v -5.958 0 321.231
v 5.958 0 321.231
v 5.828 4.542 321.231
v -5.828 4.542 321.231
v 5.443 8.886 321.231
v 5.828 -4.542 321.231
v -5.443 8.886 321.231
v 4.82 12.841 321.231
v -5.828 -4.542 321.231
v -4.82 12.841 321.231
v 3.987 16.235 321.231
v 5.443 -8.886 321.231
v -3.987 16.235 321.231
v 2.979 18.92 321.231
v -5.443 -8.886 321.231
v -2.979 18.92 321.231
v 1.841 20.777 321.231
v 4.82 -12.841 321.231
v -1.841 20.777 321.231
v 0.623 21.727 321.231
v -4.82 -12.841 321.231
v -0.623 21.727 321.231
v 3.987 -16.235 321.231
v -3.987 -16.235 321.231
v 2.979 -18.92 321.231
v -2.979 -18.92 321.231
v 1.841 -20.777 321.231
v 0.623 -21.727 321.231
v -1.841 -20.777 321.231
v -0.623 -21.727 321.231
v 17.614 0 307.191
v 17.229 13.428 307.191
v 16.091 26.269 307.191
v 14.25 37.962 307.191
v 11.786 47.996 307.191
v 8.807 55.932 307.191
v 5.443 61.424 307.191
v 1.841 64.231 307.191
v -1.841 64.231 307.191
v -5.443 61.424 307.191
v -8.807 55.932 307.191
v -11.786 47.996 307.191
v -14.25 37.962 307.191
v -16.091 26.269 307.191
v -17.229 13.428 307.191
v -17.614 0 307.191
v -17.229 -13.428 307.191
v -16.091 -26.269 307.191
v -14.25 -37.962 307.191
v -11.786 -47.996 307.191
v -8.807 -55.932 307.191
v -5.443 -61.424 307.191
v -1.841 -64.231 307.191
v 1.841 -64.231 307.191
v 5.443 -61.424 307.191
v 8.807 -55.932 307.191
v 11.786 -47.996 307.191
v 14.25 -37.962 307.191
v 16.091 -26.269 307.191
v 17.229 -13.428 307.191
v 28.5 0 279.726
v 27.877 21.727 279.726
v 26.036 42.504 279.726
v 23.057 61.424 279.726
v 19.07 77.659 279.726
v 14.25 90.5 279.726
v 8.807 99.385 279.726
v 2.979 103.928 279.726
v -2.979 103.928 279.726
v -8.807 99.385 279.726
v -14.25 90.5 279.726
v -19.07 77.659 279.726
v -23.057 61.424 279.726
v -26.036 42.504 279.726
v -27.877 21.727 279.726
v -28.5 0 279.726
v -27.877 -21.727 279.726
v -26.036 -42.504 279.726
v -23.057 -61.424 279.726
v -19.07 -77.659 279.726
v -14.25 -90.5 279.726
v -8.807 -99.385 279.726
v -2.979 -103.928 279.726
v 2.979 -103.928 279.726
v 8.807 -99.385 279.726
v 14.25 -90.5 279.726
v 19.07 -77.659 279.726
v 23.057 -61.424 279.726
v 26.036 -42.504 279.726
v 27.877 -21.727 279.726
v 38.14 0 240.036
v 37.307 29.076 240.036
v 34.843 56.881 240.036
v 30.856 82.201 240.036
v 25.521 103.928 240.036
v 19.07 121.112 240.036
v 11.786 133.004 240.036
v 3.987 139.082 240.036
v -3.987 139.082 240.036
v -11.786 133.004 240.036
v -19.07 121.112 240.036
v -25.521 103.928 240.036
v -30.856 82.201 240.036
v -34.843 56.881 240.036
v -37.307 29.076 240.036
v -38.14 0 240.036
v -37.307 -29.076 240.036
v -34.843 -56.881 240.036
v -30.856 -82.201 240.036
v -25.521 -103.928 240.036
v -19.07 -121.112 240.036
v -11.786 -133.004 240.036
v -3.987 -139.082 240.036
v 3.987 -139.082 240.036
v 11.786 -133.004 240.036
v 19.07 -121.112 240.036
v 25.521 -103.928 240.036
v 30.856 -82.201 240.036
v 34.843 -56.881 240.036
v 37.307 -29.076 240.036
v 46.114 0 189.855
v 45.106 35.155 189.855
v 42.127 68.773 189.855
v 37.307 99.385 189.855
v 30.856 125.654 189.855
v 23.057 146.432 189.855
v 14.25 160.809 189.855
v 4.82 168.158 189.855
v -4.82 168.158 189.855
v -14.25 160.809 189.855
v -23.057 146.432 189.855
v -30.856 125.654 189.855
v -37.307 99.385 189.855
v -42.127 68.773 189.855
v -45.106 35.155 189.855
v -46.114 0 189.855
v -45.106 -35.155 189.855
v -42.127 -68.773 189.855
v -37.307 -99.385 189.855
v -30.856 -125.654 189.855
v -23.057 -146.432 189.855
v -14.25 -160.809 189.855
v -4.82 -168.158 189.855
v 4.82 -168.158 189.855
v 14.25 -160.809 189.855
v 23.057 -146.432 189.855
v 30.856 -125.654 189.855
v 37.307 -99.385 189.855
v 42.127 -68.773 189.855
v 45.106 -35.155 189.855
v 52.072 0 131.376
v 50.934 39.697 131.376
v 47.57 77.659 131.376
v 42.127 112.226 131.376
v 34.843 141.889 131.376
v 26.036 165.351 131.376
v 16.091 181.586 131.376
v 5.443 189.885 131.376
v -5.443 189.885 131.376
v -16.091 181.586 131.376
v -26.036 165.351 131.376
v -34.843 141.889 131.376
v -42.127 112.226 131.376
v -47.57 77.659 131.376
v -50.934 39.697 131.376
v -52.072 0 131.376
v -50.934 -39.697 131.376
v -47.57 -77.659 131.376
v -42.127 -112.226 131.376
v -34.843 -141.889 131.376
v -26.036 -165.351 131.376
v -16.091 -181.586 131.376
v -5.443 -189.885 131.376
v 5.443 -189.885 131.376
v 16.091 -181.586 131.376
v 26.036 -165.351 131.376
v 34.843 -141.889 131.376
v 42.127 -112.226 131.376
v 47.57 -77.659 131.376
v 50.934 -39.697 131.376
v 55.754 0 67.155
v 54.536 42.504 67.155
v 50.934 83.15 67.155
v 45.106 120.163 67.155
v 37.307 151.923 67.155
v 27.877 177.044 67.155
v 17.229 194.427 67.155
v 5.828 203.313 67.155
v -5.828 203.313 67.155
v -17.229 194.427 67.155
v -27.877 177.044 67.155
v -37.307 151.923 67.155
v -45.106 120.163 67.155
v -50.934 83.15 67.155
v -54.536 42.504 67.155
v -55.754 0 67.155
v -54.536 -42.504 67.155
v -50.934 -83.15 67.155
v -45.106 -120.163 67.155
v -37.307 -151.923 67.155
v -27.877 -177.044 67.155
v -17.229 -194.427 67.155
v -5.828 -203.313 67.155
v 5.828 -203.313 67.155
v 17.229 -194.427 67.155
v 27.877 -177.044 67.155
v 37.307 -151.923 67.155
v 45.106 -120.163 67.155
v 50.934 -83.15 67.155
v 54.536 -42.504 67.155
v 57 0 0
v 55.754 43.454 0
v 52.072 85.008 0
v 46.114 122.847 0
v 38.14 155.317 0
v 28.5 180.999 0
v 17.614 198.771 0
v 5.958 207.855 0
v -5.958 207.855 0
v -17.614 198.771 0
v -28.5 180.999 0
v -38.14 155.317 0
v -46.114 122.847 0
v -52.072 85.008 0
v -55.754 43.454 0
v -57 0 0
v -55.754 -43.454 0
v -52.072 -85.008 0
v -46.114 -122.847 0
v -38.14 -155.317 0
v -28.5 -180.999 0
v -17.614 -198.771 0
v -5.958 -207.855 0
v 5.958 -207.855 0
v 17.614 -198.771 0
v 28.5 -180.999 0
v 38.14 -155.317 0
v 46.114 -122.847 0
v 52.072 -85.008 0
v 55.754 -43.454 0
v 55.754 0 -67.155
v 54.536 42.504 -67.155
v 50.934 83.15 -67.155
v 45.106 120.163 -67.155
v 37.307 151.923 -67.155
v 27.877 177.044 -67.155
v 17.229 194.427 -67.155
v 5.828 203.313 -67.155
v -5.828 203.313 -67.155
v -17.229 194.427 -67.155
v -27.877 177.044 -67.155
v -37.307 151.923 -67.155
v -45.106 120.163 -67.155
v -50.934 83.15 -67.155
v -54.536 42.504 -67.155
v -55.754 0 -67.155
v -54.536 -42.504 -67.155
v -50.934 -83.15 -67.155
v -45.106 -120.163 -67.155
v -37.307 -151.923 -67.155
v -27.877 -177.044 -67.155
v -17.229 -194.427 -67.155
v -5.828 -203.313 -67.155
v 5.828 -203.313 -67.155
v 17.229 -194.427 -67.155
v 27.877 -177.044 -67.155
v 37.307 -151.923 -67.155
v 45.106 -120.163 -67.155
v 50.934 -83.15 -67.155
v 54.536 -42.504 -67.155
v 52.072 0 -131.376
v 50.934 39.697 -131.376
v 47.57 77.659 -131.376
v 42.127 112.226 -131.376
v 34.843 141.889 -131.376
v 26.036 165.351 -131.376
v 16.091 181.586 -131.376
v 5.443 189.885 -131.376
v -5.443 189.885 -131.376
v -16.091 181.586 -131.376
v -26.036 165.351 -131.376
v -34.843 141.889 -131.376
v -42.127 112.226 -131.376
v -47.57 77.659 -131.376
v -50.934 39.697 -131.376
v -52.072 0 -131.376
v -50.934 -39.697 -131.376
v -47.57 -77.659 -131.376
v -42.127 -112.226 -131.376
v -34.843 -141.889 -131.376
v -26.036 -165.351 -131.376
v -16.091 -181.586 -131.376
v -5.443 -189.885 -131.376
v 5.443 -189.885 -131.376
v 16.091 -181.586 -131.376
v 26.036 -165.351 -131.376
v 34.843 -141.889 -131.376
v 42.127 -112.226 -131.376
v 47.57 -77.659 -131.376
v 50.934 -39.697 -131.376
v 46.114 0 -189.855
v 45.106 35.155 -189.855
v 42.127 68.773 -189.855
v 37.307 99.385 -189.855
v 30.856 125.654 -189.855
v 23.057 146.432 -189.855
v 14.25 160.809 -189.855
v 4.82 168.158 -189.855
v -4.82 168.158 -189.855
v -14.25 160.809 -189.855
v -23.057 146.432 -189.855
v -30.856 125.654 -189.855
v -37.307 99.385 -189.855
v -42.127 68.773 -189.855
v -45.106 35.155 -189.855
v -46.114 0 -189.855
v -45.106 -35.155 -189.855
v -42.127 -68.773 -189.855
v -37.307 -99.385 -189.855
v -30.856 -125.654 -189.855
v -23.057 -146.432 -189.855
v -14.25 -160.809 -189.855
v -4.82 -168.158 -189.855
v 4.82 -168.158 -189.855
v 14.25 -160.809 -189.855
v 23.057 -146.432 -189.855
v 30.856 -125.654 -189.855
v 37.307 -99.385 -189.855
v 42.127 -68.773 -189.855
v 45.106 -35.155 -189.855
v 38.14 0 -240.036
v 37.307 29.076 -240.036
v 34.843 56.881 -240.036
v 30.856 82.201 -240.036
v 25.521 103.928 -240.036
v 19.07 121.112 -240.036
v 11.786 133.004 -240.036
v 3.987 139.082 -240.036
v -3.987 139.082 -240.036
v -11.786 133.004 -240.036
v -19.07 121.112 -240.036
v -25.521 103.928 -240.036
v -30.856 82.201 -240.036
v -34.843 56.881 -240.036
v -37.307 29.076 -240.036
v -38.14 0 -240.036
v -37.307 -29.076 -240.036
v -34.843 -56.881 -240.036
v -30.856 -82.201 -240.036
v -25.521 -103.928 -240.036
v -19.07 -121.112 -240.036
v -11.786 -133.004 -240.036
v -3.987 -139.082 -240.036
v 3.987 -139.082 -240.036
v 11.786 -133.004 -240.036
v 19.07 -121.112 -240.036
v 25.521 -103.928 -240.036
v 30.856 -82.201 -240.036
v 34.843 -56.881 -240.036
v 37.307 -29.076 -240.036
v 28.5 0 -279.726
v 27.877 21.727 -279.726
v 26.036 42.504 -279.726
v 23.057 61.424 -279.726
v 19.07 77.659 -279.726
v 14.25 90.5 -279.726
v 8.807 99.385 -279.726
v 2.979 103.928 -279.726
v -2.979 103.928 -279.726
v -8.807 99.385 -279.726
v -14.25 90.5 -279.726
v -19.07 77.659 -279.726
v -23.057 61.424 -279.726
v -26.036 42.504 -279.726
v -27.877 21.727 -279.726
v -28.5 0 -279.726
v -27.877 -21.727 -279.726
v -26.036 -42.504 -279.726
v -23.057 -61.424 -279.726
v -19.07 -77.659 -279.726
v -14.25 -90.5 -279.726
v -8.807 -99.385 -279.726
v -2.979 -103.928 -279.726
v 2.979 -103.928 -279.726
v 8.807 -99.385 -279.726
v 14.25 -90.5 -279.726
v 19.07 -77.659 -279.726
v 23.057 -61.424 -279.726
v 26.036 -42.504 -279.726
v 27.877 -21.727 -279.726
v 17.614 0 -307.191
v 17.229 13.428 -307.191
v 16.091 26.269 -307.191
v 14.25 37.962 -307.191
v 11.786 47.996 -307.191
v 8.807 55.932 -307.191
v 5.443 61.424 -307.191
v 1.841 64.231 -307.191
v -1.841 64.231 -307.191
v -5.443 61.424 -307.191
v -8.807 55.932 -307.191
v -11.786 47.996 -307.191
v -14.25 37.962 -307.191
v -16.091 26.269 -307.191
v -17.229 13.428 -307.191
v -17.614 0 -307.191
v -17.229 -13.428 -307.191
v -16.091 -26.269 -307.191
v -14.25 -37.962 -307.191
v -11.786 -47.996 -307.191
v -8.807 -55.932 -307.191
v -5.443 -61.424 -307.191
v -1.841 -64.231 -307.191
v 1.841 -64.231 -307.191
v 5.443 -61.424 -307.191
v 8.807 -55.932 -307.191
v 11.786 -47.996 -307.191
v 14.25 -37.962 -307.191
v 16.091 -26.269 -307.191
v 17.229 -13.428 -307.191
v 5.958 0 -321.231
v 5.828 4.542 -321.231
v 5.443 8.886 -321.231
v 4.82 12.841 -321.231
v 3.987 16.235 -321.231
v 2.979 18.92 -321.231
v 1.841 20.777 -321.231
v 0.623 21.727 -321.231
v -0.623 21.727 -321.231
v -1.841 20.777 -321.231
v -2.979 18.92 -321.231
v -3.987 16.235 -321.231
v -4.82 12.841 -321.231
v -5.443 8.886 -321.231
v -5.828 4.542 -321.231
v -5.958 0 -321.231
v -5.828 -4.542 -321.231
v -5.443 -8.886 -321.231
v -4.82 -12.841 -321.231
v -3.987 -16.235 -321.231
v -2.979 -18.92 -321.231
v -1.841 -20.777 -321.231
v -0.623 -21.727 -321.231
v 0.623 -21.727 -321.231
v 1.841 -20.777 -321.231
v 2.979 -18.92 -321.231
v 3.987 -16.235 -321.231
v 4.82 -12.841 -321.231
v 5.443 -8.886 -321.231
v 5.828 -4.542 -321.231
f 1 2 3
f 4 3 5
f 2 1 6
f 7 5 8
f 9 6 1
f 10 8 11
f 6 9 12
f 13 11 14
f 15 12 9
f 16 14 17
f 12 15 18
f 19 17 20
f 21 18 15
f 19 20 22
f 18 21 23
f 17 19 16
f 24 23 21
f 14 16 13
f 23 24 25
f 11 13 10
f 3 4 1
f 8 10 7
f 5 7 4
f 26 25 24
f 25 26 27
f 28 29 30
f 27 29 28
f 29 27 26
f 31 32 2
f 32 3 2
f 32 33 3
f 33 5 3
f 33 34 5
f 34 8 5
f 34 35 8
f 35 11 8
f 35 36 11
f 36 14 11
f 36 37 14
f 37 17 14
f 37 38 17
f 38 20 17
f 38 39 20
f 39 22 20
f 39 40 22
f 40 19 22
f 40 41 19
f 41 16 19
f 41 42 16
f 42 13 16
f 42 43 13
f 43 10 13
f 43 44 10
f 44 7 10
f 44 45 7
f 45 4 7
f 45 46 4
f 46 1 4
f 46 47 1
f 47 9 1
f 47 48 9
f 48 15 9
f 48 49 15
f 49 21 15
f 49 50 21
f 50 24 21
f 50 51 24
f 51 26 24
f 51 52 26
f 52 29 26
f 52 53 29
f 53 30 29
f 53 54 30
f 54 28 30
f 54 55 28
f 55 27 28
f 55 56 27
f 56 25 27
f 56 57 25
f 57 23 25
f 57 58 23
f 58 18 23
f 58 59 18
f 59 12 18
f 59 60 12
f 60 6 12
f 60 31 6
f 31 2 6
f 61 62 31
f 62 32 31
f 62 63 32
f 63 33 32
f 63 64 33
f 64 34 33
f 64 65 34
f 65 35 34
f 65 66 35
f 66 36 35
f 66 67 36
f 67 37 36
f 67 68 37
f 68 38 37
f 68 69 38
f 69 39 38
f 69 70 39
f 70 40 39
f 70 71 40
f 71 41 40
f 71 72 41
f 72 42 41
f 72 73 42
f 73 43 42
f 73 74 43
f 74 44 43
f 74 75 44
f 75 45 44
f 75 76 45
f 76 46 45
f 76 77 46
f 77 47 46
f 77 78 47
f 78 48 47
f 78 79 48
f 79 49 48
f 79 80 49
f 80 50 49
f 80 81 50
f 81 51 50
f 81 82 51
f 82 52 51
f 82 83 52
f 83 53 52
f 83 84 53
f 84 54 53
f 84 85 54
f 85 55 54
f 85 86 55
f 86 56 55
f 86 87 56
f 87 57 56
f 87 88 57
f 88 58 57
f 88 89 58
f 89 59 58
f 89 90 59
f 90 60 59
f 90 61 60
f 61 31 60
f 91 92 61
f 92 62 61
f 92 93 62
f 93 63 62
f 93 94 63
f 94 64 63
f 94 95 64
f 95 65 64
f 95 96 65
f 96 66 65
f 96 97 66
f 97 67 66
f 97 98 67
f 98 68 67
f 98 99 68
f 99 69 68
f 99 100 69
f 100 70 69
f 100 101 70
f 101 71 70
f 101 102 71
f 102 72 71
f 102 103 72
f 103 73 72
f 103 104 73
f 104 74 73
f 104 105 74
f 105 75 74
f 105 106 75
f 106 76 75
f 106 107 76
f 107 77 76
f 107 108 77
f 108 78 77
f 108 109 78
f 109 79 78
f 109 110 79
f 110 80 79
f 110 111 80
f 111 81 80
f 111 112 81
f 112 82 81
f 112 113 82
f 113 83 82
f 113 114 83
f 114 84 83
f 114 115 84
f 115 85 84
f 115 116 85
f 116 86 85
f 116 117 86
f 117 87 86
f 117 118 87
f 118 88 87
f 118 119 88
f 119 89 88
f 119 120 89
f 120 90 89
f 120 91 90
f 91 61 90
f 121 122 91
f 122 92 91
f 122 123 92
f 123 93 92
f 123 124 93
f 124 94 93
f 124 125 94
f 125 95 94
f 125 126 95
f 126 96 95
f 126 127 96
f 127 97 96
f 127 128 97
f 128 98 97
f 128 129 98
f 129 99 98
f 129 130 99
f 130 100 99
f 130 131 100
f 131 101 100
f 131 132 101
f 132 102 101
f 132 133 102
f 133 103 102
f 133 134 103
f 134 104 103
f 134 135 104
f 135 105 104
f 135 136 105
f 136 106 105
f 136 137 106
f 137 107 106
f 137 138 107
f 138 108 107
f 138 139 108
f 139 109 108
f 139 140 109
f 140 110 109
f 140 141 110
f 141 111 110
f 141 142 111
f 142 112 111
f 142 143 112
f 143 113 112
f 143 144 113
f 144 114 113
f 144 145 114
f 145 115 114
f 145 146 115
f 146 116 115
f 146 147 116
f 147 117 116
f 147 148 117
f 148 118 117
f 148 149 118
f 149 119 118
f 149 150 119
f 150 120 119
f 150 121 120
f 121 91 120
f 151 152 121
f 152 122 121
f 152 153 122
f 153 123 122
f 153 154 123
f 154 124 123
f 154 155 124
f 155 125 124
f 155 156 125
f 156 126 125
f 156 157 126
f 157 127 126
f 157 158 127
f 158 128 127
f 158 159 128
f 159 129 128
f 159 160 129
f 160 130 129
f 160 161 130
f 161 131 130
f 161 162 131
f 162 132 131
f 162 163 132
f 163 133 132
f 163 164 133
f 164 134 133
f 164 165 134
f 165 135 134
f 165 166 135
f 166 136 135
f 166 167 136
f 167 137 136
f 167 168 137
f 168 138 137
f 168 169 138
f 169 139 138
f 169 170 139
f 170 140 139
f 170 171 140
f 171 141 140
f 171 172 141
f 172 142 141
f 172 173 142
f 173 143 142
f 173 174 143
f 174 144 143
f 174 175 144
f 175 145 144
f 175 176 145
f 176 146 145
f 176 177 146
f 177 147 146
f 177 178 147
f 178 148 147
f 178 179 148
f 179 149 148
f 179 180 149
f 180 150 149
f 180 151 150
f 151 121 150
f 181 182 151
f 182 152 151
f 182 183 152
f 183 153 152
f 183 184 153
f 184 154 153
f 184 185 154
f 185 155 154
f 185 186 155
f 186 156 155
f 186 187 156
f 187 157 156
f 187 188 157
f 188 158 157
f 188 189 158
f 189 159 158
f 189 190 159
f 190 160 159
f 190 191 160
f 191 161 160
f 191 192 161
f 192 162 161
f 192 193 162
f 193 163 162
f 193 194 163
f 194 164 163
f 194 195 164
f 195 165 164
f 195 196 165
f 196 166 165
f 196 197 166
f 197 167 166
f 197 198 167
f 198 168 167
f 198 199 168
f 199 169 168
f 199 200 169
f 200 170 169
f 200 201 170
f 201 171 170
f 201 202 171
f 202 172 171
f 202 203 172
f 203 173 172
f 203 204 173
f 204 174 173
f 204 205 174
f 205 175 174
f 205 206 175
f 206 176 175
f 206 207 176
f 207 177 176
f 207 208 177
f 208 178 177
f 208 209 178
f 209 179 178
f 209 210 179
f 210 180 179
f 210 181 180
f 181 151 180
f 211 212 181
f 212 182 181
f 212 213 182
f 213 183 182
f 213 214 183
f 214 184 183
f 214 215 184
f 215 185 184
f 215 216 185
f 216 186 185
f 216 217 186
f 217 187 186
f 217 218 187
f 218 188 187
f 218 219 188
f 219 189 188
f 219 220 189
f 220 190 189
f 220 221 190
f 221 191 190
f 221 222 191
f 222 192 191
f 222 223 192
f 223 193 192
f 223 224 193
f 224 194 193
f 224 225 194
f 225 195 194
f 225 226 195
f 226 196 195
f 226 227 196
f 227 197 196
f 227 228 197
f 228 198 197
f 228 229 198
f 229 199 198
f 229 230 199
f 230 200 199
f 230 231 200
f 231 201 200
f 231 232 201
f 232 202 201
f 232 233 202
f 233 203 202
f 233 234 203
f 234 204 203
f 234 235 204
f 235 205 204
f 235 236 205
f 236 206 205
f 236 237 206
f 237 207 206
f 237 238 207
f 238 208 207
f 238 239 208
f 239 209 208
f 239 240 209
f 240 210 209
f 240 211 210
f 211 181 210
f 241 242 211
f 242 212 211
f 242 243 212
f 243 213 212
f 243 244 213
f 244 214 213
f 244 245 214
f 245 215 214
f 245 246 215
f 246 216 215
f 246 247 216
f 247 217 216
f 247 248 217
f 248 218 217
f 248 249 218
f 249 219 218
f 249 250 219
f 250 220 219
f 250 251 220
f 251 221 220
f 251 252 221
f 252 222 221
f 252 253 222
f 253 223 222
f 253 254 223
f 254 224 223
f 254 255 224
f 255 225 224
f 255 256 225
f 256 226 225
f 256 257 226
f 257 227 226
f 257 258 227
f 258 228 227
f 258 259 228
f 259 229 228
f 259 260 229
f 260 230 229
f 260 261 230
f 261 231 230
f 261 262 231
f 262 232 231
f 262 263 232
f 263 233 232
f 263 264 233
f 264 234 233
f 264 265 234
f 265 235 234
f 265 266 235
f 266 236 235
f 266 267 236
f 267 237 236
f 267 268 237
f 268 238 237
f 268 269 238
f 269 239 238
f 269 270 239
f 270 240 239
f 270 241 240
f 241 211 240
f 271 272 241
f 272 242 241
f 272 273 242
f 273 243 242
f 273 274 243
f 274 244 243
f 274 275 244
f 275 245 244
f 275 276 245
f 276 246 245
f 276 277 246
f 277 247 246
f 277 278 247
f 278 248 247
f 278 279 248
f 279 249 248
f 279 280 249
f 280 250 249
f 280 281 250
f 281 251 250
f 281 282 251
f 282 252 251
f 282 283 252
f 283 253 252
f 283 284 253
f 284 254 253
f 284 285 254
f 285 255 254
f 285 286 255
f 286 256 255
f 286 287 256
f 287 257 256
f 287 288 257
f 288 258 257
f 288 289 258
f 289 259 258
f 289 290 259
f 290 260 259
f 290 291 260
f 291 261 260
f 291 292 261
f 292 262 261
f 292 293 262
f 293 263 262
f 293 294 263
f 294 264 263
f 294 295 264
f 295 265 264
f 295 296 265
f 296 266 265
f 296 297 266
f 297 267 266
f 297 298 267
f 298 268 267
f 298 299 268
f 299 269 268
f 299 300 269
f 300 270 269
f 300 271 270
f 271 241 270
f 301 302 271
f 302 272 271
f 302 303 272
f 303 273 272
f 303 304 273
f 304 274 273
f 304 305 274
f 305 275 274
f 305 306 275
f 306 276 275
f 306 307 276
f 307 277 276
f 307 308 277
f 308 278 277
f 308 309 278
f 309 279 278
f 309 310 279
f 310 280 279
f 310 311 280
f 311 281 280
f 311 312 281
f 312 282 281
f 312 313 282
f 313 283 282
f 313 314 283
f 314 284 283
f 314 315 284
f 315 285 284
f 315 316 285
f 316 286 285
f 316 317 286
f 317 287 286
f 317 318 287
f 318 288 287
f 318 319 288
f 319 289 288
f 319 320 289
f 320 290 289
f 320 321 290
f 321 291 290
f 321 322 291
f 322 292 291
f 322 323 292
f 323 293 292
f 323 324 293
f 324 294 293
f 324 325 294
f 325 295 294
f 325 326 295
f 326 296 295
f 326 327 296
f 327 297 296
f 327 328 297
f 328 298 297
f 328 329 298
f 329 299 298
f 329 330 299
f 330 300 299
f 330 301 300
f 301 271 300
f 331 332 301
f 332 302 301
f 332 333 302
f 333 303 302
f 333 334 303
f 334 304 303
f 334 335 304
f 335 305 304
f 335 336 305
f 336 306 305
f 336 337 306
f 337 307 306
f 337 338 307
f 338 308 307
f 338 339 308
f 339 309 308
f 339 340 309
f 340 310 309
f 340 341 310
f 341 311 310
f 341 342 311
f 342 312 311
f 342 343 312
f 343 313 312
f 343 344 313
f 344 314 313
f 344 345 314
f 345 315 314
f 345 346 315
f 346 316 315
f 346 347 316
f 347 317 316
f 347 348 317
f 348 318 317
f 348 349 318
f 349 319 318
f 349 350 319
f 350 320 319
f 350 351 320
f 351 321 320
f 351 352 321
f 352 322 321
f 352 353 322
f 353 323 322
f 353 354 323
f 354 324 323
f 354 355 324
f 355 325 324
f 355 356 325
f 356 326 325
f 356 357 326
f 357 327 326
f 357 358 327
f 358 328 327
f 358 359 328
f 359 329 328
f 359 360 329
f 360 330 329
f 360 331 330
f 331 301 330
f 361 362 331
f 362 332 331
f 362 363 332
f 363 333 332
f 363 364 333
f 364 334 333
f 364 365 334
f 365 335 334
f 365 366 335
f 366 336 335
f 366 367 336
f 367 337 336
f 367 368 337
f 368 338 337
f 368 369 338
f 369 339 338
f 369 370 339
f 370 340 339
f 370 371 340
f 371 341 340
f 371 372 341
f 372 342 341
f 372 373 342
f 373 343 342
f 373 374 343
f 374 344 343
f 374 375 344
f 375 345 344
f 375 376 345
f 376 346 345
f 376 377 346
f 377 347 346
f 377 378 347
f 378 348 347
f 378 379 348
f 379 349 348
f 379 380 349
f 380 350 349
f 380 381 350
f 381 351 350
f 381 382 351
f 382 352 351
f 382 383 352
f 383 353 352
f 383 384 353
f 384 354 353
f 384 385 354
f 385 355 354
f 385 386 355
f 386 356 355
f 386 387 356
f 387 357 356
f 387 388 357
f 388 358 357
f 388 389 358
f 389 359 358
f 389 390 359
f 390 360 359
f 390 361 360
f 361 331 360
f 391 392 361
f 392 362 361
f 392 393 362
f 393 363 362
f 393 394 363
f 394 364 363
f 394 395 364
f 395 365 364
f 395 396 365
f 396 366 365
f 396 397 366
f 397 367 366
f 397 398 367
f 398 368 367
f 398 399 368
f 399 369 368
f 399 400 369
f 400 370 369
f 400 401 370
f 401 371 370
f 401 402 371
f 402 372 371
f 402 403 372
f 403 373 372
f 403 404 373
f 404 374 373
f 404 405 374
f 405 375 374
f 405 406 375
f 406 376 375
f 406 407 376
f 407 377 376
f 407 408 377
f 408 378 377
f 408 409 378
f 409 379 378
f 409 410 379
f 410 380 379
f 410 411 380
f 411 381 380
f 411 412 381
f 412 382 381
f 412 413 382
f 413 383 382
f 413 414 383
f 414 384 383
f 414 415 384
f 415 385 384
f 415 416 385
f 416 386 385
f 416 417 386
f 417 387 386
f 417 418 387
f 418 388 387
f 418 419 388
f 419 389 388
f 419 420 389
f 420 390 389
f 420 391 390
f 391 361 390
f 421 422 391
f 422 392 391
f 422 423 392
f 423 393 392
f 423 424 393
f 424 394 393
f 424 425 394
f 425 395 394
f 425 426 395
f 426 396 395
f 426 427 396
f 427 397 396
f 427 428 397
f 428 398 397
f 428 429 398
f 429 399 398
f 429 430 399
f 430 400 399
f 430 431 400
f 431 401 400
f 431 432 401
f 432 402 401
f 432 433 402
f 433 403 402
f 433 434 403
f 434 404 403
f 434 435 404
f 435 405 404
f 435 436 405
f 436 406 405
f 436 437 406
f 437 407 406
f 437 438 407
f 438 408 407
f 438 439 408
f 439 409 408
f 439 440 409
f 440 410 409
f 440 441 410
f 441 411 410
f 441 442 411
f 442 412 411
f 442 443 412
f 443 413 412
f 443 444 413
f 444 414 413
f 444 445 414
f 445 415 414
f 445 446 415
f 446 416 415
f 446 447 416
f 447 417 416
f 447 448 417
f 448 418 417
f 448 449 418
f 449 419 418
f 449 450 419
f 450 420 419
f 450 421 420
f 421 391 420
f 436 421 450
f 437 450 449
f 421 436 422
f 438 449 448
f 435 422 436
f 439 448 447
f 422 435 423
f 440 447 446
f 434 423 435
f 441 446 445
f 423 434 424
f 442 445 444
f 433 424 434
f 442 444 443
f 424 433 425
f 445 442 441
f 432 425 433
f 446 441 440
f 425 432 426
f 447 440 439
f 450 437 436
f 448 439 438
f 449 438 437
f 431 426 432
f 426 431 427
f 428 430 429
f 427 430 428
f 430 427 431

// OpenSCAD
// Generated by SolidPython 1.0.1 on 2020-07-29 00:46:45


scale(v = [3, 11, 17]) {
	sphere(r = 19);
}
/***********************************************
*********      SolidPython code:      **********
************************************************
 
# import packages: SolidPython
from solid import *
from solid.utils import *
from itertools import chain, combinations, permutations


class Resize:

    def __init__(self, scad_file):
        self.scad_file = scad_file
        #self.scad_file = import_scad(scad_file)
        # cone/cylinder param:
        self.r1 = 0
        self.r2 = 0
        self.h = 0
        # rectangular prism param:
        self.w = 0
        self.l = 0
        # ellipse param:
        self.r = 0

    # import OpenScad code (file name corresponds to shape)


    # classify shape + parameters
    def assign(self, param1, param2, param3):
        if self.scad_file == 'cone.scad':
            self.r1 = param1
            self.r2 = param2
            self.h = param3
        elif self.scad_file == 'cylinder.scad':
            self.r1 = param1
            self.r2 = param2
            self.h = param3
        elif self.scad_file == 'rectangularPrism.scad':
            self.h = param1
            self.l = param2
            self.w = param3
        else:
            self.r = param1
            self.h = param2

    # resize parameters
    def iterate(self):
        x = range(3, 20, 2)
        i = 1
        if self.scad_file == 'cone.scad':
            tempList = list(permutations(x, 2))
            for temp in tempList:
                param1 = temp[0]
                param2 = temp[1]
                filepath = 'produced_scad_files/' + 'cone' + str(param1) + '_' + str(param2) + '_' + '.scad'
                scad_render_to_file(cylinder(h=param1, r1=param2, r2=0), filepath)

        elif self.scad_file == 'cylinder.scad':
            tempList = list(permutations(x, 3))
            for temp in tempList:
                param1 = temp[0]
                param2 = temp[1]
                filepath = 'produced_scad_files/' + 'cylinder' + str(param1) + '_' + str(param2) + '_' + '.scad'
                scad_render_to_file(cylinder(h=param1, r1=param2, r2=param2), filepath)

        elif self.scad_file == 'rectangularPrism.scad':
            tempList = list(permutations(x, 3))
            for temp in tempList:
                param1 = temp[0]
                param2 = temp[1]
                param3 = temp[2]
                filepath = 'produced_scad_files/' + 'rectangularPrism' + str(param1) + '_' + str(param2) + '_' + str(
                    param3) + '.scad'
                scad_render_to_file(cube(size=(param1, param2, param3)), filepath)

        elif self.scad_file == 'ellipse.scad':
            tempList = list(permutations(x, 4))
            for temp in tempList:
                param1 = temp[0]
                param2 = temp[1]
                param3 = temp[2]
                param4 = temp[3]
                filepath = 'produced_scad_files/' + 'ellipse' + str(param1) + '_' + str(param2) + '_' + str(param3) + '_' + str(param4) + '.scad'
                scad_render_to_file(scale([param1, param2, param3])(sphere(r=param4)), filepath)

    def render_to_scadfile(self):
        scad_render_to_file(scad, 'example.scad') 
 
************************************************/
